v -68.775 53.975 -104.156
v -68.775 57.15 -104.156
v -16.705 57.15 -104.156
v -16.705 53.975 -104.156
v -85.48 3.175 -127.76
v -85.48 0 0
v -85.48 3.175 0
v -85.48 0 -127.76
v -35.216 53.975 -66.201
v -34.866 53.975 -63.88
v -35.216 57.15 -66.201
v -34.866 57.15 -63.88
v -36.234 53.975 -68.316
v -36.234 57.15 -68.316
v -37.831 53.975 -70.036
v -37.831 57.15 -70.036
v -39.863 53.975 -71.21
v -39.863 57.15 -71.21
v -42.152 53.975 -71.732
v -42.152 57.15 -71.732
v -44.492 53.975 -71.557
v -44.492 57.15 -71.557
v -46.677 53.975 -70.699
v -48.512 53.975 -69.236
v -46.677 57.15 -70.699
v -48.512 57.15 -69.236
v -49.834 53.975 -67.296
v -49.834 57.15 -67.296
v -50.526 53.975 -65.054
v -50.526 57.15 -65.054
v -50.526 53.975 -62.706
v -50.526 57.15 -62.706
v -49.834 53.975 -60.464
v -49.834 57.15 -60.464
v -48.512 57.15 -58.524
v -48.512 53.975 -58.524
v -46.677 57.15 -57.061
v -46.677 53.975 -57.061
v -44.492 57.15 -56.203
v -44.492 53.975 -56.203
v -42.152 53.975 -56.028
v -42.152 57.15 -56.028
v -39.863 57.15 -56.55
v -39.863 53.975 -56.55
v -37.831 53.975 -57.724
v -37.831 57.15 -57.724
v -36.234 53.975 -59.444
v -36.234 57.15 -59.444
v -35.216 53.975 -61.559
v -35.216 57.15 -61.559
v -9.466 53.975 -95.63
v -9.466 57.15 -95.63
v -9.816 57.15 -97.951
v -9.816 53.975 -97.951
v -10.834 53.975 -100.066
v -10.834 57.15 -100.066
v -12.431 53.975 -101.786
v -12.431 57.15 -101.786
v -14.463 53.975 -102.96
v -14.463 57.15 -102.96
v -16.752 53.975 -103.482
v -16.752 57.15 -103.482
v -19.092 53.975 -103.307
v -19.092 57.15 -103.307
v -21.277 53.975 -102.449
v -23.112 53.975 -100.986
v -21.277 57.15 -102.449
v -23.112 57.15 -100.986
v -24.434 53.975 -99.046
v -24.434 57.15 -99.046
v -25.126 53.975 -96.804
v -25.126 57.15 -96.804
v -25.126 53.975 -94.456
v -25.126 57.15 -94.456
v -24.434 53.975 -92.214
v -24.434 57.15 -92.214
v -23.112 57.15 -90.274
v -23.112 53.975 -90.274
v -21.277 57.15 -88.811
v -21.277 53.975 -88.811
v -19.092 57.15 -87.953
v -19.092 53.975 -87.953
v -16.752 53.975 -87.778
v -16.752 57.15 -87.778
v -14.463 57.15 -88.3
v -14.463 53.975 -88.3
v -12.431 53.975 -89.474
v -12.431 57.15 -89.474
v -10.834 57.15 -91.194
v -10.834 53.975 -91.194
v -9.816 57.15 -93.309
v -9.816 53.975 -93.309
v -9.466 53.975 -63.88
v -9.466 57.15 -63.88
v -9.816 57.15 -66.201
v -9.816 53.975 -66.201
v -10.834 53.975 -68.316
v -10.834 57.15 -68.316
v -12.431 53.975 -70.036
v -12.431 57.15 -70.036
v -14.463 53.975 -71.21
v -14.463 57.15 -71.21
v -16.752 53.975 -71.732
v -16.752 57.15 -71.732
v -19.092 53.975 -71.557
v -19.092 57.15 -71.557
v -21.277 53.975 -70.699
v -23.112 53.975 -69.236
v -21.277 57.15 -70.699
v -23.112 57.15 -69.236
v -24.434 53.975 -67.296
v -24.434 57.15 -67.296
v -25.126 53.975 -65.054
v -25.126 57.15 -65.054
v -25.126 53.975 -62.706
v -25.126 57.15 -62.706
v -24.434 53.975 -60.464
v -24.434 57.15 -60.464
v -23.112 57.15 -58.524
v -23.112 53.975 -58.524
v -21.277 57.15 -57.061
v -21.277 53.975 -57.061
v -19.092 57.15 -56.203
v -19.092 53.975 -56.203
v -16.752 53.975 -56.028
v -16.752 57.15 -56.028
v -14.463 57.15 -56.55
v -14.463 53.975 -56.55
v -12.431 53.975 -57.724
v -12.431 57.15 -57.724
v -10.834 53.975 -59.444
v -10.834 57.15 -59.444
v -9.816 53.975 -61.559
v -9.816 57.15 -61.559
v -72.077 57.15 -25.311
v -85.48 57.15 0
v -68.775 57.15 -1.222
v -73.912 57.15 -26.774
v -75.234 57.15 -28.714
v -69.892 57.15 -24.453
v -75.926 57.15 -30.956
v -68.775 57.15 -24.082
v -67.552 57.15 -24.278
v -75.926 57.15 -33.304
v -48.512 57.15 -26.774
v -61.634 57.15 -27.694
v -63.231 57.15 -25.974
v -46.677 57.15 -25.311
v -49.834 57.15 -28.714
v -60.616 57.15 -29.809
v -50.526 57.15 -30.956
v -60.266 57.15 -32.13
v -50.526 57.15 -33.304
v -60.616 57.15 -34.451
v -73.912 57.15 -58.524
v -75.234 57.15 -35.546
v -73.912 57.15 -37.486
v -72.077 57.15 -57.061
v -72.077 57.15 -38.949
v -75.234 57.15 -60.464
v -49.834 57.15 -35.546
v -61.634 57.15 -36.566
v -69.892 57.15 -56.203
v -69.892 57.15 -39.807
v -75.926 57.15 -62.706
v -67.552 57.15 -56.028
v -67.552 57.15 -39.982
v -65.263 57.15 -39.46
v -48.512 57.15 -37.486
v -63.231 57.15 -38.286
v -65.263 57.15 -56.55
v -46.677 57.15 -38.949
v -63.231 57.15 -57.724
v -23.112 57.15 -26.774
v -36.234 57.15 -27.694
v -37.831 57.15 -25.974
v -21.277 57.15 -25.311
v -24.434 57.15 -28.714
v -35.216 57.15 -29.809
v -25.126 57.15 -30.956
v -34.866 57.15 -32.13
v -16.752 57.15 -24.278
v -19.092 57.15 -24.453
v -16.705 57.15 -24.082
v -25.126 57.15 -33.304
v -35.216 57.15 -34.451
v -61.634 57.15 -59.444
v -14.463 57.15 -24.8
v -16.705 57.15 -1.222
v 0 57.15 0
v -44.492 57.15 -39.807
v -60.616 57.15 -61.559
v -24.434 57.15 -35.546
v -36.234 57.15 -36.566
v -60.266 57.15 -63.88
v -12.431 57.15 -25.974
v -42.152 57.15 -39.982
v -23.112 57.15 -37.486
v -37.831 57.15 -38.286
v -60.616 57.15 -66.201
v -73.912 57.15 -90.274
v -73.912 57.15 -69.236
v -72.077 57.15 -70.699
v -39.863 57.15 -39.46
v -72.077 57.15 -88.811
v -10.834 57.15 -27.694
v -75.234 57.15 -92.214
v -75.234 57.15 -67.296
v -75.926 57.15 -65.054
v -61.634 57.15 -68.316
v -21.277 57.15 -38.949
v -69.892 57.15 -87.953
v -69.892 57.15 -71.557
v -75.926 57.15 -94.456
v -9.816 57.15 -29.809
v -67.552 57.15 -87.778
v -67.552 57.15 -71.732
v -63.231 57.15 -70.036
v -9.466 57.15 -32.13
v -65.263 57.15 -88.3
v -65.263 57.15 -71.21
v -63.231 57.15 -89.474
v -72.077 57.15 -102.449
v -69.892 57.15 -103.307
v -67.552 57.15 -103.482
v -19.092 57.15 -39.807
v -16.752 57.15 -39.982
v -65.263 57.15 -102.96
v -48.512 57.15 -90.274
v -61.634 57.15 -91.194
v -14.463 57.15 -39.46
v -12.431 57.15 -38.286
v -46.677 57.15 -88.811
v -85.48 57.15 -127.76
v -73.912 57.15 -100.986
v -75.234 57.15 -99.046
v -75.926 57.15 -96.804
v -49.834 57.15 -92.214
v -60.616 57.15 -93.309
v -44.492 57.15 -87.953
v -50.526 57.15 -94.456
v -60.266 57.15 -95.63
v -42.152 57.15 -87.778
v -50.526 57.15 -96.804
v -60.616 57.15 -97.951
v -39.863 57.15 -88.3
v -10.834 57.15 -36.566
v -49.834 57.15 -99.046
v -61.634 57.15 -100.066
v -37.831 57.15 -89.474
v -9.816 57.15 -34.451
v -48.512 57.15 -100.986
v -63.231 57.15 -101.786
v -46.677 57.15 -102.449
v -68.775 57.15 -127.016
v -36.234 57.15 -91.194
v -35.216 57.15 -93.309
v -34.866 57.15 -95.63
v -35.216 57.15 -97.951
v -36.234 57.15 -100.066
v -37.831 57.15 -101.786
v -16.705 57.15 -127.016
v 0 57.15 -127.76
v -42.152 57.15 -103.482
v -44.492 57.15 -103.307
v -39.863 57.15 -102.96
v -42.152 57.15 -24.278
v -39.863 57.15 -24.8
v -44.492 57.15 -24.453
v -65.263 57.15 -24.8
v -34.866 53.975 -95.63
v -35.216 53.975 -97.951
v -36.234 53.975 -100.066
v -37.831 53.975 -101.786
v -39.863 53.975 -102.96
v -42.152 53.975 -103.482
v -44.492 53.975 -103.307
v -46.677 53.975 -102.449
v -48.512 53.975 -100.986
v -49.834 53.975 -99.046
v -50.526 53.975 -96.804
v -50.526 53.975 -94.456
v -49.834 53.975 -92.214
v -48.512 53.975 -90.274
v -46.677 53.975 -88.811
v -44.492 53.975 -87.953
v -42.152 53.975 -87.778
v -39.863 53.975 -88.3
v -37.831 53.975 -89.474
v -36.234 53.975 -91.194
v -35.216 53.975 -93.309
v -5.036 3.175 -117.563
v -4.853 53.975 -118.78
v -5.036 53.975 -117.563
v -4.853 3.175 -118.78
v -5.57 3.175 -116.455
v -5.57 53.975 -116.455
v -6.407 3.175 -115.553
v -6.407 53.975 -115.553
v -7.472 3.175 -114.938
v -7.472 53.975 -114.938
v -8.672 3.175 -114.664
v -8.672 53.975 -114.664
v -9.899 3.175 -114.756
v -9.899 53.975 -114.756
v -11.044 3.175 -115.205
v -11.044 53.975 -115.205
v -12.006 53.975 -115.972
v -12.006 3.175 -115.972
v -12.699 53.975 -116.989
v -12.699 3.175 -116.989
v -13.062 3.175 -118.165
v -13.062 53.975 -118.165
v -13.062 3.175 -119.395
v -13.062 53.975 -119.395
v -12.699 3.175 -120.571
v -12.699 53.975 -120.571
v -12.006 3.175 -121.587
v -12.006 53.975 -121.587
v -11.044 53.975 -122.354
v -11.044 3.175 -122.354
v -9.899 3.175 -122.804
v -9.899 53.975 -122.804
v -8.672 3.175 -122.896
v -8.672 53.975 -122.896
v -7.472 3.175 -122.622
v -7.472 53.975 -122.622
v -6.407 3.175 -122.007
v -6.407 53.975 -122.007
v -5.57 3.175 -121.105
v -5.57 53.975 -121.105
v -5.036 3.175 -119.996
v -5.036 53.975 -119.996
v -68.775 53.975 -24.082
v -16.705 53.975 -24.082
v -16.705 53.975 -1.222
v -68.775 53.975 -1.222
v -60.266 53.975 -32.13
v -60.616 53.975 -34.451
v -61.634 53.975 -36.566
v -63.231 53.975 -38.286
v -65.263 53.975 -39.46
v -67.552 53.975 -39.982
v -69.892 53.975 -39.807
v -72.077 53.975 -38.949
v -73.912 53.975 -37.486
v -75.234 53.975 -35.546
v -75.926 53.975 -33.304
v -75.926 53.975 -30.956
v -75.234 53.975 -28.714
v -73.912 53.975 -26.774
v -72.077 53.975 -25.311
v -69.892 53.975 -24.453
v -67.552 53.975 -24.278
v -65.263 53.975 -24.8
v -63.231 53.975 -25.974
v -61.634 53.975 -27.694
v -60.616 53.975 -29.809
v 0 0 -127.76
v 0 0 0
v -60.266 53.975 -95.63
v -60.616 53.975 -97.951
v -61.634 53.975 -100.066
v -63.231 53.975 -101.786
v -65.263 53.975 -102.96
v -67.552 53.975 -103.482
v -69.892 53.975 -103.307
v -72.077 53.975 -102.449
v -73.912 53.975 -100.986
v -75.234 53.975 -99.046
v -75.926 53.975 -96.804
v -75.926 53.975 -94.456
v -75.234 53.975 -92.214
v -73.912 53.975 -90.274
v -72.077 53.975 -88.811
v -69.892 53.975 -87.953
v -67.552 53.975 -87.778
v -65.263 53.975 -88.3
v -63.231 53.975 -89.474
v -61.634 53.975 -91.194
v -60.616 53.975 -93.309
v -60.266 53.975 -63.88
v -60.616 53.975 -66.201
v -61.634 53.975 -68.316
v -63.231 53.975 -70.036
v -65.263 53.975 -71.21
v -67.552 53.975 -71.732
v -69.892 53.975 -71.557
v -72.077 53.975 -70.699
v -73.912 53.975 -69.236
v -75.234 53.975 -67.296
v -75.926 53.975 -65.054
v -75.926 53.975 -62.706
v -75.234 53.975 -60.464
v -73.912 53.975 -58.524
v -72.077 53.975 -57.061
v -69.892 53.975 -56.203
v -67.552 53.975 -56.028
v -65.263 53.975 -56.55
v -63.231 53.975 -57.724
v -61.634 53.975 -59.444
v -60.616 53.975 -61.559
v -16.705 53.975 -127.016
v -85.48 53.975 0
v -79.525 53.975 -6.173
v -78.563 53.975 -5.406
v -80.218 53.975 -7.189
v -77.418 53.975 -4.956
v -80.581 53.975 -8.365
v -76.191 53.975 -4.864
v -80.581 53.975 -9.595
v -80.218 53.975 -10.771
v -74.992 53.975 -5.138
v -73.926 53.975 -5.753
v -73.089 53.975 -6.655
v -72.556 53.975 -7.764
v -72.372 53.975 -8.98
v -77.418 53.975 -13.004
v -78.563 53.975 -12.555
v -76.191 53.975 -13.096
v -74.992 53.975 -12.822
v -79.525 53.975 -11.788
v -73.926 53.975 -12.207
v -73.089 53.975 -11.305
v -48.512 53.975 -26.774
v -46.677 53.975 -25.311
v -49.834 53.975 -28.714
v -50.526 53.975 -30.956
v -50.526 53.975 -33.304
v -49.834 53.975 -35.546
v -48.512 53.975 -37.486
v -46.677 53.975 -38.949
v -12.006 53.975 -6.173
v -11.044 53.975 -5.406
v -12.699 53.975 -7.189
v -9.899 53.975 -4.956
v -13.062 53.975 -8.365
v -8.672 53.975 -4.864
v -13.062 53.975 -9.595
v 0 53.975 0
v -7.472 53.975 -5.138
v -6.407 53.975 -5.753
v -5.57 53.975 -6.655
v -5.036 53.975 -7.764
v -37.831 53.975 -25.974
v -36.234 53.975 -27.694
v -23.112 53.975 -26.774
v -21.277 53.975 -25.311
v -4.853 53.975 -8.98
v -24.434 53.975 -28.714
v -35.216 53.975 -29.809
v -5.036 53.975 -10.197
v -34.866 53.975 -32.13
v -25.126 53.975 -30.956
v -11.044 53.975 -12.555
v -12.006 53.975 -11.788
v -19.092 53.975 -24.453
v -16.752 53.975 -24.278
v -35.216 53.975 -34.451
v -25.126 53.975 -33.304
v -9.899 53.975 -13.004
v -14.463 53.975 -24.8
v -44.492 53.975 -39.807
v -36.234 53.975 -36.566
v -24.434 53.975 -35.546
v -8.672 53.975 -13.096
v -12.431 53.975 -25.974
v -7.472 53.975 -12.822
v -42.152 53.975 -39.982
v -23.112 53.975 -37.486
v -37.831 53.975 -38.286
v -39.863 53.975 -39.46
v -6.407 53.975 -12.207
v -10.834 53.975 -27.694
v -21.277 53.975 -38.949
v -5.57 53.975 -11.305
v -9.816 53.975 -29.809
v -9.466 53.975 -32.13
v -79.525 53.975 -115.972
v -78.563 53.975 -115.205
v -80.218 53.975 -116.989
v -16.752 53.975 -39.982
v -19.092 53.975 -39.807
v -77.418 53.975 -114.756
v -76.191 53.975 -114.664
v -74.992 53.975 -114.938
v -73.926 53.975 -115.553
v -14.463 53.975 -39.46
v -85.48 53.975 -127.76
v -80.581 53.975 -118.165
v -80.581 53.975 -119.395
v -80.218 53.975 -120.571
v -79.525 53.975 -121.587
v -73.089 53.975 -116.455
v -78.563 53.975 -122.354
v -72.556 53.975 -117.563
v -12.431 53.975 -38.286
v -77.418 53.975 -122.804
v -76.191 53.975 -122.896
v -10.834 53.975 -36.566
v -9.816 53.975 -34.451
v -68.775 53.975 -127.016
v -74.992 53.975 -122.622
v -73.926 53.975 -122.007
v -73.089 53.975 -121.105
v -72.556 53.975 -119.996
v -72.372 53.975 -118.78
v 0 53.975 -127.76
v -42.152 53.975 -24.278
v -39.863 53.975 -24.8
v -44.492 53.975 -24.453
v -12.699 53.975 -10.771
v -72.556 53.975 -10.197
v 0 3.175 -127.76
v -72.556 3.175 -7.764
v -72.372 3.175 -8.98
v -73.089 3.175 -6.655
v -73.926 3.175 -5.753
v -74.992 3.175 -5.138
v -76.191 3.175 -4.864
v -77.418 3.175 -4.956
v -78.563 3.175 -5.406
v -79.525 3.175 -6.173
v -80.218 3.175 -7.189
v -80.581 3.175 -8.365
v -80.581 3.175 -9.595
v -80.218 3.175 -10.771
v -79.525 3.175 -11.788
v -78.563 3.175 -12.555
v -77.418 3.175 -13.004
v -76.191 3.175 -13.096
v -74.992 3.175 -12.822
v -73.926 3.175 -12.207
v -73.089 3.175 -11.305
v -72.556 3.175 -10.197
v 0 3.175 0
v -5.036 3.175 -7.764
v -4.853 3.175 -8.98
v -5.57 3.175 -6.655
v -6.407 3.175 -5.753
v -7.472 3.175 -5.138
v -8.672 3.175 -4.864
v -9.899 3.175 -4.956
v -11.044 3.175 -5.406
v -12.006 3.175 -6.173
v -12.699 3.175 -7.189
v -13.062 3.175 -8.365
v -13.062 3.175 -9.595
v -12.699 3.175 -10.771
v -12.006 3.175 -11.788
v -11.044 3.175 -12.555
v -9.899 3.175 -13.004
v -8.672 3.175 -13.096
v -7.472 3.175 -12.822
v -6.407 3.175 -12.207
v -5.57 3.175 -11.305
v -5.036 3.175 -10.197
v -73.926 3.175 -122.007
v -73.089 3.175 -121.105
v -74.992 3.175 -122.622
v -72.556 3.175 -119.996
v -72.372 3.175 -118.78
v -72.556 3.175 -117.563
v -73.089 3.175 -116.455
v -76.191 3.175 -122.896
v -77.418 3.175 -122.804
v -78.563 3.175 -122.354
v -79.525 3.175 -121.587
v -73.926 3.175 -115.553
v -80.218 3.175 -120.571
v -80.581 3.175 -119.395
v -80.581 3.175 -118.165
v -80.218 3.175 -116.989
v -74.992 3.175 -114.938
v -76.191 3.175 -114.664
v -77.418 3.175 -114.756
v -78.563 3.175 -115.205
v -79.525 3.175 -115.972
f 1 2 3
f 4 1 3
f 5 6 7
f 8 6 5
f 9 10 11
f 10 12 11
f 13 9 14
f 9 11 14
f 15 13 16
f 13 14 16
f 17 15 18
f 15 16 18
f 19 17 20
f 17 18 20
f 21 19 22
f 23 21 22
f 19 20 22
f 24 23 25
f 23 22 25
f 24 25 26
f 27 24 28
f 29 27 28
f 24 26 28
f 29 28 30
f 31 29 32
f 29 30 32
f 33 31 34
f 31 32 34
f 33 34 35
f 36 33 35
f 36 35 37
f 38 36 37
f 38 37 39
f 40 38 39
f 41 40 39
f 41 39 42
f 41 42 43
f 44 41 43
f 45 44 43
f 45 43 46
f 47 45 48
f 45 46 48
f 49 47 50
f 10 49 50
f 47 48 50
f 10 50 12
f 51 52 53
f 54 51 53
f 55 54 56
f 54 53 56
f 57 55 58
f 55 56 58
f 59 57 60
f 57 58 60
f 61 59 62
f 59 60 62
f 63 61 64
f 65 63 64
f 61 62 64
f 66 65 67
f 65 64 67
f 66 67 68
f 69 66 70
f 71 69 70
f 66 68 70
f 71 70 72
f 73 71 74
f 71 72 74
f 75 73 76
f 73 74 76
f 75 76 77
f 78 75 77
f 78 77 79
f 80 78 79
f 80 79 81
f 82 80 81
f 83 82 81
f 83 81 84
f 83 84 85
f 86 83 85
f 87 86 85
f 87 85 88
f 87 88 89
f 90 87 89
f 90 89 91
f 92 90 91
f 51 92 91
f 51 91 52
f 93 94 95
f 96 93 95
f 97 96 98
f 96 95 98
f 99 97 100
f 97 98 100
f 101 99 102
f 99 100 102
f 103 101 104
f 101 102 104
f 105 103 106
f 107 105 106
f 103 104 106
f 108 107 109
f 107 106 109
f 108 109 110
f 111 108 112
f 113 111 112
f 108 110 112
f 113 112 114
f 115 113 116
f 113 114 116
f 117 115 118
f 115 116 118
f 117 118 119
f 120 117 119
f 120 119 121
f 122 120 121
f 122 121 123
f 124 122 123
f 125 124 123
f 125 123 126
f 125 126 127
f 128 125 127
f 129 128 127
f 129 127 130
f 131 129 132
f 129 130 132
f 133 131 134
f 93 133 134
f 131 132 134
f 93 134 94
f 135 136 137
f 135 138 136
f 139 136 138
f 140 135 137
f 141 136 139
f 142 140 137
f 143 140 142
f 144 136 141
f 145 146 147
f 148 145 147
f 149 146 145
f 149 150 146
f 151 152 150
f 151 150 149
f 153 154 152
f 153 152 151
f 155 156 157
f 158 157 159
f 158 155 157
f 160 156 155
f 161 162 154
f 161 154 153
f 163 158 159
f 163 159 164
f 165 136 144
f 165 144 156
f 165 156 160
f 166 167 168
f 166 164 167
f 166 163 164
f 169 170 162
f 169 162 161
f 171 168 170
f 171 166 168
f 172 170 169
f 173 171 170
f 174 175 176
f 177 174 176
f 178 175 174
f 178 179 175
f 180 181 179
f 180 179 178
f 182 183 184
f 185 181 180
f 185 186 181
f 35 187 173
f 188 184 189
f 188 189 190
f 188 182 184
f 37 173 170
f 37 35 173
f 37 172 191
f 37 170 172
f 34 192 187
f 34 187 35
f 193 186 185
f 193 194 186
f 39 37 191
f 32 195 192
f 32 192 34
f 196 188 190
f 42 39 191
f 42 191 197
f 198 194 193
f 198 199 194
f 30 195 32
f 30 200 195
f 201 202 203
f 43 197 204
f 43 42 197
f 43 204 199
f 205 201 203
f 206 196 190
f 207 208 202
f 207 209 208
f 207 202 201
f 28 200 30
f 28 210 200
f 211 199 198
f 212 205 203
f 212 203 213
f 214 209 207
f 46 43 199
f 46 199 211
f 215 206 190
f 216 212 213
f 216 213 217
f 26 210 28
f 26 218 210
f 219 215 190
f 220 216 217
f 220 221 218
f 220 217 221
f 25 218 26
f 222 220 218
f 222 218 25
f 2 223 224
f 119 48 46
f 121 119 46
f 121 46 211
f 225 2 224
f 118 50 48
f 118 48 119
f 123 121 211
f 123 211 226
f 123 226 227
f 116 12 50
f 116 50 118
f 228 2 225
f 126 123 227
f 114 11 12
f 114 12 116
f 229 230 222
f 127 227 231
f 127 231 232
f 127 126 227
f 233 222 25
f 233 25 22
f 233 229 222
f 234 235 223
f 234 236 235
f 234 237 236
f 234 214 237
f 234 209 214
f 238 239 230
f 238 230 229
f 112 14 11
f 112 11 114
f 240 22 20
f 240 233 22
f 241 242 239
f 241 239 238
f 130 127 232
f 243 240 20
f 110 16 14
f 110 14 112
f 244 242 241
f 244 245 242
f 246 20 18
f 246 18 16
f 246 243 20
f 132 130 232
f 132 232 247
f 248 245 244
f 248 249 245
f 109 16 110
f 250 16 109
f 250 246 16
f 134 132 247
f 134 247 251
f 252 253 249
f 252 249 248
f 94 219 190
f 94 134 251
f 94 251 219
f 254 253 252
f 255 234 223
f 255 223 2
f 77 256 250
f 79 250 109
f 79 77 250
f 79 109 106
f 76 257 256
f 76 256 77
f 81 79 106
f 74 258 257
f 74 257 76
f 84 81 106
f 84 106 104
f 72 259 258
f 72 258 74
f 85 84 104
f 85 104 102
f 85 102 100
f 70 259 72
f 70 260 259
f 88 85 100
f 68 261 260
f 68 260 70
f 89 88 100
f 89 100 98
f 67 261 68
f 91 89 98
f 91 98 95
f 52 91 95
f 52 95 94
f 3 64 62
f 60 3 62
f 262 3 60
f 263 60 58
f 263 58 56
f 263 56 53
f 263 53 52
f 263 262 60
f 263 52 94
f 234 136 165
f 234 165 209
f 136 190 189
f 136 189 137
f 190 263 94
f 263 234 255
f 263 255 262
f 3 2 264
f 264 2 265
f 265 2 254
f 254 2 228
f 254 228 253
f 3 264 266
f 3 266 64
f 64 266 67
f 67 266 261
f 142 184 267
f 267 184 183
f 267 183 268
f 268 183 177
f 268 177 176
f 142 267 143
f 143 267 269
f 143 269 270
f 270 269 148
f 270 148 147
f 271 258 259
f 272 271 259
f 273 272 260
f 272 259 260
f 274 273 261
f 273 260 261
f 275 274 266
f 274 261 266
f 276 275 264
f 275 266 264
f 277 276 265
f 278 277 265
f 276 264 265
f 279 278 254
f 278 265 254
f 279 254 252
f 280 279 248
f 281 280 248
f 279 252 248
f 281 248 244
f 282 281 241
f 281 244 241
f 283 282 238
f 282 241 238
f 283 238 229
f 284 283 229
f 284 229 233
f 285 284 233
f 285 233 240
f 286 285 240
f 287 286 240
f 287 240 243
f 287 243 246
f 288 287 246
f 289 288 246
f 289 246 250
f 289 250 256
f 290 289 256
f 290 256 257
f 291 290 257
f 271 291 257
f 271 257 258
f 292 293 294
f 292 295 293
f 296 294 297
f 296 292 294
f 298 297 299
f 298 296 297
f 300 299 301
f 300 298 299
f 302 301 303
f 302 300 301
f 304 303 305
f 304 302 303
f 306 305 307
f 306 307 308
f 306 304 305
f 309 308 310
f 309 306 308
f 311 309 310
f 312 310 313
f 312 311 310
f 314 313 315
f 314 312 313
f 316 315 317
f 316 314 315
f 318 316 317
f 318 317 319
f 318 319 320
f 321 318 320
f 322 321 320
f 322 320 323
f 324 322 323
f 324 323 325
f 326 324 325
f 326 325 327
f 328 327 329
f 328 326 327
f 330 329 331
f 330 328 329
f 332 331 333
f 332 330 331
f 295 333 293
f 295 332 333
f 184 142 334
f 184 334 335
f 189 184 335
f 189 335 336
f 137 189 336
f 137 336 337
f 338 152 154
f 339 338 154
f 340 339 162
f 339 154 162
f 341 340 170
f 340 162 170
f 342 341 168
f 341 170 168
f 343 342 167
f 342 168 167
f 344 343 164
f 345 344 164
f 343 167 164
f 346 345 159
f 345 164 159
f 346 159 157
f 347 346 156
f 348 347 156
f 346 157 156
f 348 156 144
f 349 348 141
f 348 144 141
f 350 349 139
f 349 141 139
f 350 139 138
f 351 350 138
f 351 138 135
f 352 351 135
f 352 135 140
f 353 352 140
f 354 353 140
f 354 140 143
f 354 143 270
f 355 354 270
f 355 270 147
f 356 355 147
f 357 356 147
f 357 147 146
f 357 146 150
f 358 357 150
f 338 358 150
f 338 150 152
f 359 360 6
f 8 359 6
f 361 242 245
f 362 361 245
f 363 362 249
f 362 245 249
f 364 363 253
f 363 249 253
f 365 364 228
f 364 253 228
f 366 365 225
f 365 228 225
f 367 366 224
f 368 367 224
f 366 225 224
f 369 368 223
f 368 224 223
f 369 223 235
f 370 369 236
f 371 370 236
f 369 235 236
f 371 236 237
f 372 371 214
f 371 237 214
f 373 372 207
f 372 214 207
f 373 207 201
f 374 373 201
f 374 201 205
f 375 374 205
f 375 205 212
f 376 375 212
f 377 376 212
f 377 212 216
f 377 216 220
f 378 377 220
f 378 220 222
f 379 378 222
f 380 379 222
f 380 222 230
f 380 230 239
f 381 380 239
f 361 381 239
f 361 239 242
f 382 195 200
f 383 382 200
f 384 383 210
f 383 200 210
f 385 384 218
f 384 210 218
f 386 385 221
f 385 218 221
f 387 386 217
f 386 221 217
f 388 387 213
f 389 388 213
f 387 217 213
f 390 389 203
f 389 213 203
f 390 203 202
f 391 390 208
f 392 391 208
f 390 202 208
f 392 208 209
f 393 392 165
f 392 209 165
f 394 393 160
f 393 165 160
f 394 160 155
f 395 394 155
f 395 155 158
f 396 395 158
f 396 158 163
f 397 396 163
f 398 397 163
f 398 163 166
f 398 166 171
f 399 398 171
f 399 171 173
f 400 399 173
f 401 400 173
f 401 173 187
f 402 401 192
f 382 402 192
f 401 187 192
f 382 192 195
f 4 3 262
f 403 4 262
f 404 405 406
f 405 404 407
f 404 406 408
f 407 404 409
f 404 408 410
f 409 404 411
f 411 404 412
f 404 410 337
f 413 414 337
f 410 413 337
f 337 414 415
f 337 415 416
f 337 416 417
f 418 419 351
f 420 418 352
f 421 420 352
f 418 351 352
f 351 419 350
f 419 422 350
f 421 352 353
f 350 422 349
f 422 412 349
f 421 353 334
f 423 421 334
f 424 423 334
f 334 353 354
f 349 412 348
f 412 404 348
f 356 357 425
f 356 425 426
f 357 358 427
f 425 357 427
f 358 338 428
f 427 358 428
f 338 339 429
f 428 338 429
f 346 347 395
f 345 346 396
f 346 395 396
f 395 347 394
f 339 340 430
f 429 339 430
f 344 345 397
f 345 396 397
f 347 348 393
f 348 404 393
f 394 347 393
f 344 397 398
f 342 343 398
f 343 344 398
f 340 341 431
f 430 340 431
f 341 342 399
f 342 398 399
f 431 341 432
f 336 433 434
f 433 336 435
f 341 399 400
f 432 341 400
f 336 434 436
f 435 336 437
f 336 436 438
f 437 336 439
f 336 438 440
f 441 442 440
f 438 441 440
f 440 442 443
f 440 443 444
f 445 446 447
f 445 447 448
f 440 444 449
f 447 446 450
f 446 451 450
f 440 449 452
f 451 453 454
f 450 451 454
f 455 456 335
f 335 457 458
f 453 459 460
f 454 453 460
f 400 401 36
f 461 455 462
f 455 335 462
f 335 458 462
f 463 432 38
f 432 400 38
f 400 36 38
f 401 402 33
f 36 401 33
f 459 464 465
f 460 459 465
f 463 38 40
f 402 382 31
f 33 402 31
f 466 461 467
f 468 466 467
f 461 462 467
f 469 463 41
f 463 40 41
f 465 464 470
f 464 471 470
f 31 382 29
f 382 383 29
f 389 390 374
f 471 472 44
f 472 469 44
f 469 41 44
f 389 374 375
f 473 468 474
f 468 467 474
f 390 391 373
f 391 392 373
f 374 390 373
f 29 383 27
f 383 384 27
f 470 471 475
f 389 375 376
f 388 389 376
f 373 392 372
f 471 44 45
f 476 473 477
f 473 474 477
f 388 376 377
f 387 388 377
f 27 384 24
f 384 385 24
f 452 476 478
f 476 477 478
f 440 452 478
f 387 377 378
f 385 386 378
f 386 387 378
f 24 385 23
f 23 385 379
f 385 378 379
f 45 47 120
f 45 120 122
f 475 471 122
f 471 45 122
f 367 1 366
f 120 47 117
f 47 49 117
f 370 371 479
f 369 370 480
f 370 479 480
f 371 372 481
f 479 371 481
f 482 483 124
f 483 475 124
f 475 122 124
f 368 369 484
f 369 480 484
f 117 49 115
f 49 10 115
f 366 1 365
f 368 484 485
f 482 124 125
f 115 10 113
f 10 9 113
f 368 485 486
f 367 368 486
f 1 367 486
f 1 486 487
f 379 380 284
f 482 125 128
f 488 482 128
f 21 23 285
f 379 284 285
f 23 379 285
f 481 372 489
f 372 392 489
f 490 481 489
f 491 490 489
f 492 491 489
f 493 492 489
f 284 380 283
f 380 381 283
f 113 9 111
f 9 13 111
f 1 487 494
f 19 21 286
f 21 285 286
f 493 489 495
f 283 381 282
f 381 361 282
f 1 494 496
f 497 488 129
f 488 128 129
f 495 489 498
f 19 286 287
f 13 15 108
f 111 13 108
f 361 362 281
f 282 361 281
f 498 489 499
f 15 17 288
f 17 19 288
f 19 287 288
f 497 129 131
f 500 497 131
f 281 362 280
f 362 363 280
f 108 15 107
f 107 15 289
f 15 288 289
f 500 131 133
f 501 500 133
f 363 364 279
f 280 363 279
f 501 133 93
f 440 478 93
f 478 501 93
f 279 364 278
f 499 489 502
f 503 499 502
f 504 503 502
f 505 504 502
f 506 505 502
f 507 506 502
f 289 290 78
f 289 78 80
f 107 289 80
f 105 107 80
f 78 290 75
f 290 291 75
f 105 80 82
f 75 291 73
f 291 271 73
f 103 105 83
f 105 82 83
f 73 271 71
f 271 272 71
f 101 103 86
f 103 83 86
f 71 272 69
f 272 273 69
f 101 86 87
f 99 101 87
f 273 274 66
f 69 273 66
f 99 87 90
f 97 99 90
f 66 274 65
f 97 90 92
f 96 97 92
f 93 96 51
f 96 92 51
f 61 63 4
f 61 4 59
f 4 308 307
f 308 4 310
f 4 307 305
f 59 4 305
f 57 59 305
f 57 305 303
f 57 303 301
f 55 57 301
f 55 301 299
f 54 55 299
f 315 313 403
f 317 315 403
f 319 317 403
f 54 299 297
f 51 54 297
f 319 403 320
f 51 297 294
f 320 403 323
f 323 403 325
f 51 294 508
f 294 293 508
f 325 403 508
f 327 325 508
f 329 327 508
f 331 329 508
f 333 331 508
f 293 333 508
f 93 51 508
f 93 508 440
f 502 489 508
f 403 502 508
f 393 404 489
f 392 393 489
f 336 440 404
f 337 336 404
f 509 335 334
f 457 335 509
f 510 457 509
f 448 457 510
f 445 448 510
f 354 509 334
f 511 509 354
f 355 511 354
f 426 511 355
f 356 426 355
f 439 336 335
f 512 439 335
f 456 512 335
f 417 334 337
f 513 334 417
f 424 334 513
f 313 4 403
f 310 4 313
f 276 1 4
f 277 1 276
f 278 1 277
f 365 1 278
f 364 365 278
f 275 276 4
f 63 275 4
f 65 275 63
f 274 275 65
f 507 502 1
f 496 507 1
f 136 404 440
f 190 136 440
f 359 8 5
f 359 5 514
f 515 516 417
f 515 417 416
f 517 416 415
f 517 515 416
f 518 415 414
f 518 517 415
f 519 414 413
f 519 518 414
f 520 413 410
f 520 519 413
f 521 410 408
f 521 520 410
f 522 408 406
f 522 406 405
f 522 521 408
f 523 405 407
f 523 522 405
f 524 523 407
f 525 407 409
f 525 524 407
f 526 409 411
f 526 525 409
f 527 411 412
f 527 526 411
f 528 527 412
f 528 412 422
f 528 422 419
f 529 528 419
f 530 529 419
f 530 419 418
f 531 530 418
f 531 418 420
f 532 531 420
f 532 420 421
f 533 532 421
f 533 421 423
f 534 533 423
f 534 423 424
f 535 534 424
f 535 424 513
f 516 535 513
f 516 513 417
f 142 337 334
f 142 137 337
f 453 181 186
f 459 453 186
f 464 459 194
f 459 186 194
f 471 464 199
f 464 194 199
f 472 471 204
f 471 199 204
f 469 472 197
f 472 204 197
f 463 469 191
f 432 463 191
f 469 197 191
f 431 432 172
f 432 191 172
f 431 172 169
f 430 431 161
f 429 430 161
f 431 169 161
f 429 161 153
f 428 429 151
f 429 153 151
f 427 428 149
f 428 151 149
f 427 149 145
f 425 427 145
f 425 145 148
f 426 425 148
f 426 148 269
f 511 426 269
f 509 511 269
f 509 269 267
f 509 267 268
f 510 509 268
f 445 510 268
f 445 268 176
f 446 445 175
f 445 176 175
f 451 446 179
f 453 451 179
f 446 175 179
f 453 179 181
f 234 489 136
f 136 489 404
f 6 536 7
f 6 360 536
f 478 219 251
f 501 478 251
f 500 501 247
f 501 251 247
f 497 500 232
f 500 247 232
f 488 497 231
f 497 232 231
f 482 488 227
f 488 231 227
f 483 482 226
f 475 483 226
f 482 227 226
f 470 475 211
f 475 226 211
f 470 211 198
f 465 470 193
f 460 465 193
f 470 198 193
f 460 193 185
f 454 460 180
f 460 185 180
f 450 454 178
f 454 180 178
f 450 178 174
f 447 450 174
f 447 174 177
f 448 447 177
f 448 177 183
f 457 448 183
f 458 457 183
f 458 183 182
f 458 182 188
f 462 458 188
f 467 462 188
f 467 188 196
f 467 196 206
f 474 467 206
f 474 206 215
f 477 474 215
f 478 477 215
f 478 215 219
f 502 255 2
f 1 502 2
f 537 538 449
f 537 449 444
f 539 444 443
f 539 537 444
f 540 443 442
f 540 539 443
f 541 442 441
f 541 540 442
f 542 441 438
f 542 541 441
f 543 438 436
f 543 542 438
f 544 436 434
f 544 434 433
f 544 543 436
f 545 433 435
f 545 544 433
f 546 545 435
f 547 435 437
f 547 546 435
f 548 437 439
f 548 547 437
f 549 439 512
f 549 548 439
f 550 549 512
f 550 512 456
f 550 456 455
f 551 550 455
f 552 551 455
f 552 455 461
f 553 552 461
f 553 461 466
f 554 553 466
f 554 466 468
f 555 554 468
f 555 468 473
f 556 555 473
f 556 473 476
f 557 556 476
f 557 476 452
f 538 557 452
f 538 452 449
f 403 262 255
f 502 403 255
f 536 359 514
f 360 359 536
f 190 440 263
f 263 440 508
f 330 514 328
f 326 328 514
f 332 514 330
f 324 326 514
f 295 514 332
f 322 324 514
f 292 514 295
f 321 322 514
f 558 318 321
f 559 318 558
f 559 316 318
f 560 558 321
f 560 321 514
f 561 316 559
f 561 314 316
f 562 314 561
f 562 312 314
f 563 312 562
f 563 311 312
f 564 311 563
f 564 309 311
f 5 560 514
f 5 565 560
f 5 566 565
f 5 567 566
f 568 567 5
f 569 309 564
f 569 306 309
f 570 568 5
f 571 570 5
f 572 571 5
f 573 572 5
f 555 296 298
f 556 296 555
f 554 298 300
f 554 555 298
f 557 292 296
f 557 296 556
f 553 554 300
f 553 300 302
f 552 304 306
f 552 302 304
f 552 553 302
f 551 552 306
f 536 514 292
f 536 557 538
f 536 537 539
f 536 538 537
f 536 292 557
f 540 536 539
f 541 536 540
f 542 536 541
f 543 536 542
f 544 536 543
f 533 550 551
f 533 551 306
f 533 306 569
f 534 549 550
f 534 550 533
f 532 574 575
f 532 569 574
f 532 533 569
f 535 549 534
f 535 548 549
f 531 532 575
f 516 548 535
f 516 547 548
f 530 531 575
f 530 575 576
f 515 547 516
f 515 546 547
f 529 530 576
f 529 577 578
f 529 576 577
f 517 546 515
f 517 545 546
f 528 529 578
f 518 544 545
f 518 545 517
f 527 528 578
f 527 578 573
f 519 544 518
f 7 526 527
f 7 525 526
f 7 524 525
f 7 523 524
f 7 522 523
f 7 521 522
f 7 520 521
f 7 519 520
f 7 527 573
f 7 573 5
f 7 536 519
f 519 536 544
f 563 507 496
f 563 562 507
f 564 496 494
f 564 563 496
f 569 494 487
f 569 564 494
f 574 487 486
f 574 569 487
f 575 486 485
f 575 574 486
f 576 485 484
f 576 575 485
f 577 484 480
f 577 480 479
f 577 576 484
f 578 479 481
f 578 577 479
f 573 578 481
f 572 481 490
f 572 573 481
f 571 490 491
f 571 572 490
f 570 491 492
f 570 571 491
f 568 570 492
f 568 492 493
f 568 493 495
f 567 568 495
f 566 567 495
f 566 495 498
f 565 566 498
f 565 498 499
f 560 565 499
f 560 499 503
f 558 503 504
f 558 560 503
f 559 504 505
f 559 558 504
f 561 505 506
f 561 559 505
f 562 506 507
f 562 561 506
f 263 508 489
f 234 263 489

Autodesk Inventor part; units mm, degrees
ref_plane "YZ Plane" through (0, 0, 0) normal (1, 0, 0) x (0, 1, 0)
ref_plane "XZ Plane" through (0, 0, 0) normal (0, 1, 0) x (-1, 0, 0)
ref_plane "XY Plane" through (0, 0, 0) normal (0, 0, 1) x (1, 0, 0)
sketch "Sketch1" plane through (0, 0, 0) normal (0, 1, 0) x (-1, 0, 0)
  line L0 (0, 0) -> (85.48, 0)
  line L1 (85.48, 0) -> (85.48, -127.76)
  line L2 (85.48, -127.76) -> (0, -127.76)
  line L3 (0, -127.76) -> (0, 0)
  dimension "d0" = 85.48
  dimension "d1" = 127.76
extrude "Extrusion1" add sketch "Sketch1" along normal blind 3.175
sketch "Sketch2" plane through (0, 3.175, 0) normal (0, 1, 0) x (1, 0, 0)
  line L0 (0, 0) -> (-8.9803, 8.9803)
  line L1 (-85.48, 127.76) -> (-85.48, 0) projected
  line L2 (-85.48, 0) -> (-76.4997, 8.9803)
  line L3 (-85.48, 0) -> (-72.78, 0) construction
  line L4 (0, 127.76) -> (-85.48, 127.76) projected
  line L5 (-85.48, 127.76) -> (-76.4997, 118.7797)
  line L6 (-85.48, 127.76) -> (-72.78, 127.76) construction
  line L7 (0, 127.76) -> (-8.9803, 118.7797)
  circle A0 centre (-76.4997, 118.7797) radius 4.1275
  circle A1 centre (-8.9803, 118.7797) radius 4.1275
  circle A2 centre (-76.4997, 8.9803) radius 4.1275
  circle A3 centre (-8.9803, 8.9803) radius 4.1275
  dimension "d4" = 12.7
  dimension "d5" = 12.7
  dimension "d6" = 45
  dimension "d7" = 12.7
  dimension "d8" = 45
  dimension "d9" = 12.7
  dimension "d10" = 8.255
  dimension "d11" = 8.255
  dimension "d12" = 8.255
  dimension "d13" = 8.255
extrude "Extrusion2" add sketch "Sketch2" along normal blind 50.8
sketch "Sketch3" plane through (-76.4997, 53.975, -8.9803) normal (0, 1, 0) x (1, 0, 0)
  line L0 (-8.9803, -8.9803) -> (76.4997, -8.9803) projected
  line L1 (-8.9803, 118.7797) -> (-8.9803, -8.9803) projected
  line L2 (76.4997, 118.7797) -> (-8.9803, 118.7797) projected
  line L3 (76.4997, -8.9803) -> (76.4997, 118.7797) projected
extrude "Extrusion3" add sketch "Sketch3" along normal blind 3.175
sketch "Sketch4" plane through (-76.4997, 57.15, -8.9803) normal (0, 1, 0) x (1, 0, 0)
  line L0 (-8.9803, -8.9803) -> (76.4997, -8.9803) projected
  line L1 (33.7597, -8.9803) -> (33.7597, 118.7797)
  line L2 (76.4997, 118.7797) -> (-8.9803, 118.7797) projected
  line L3 (33.7597, 54.8997) -> (33.7597, 86.6497)
  line L4 (33.7597, 54.8997) -> (65.5097, 54.8997) construction
  line L5 (33.7597, 54.8997) -> (33.7597, 23.1497)
  circle A0 centre (33.7597, 86.6497) radius 7.874
  circle A1 centre (33.7597, 23.1497) radius 7.874
  circle A2 centre (33.7597, 54.8997) radius 7.874
  line L6 (33.7597, 86.6497) -> (59.1597, 86.6497)
  circle A3 centre (59.1597, 86.6497) radius 7.874
  line L7 (33.7597, 86.6497) -> (8.3597, 86.6497)
  line L8 (33.7597, 54.8997) -> (59.1597, 54.8997)
  line L9 (33.7597, 54.8997) -> (8.3597, 54.8997)
  line L10 (33.7597, 23.1497) -> (59.1597, 23.1497)
  line L11 (33.7597, 23.1497) -> (8.3597, 23.1497)
  line L12 (33.7597, 23.1497) -> (59.1597, 23.1497) construction
  circle A4 centre (8.3597, 86.6497) radius 7.874
  circle A5 centre (8.3597, 54.8997) radius 7.874
  circle A6 centre (59.1597, 54.8997) radius 7.874
  circle A7 centre (59.1597, 23.1497) radius 7.874
  circle A8 centre (8.3597, 23.1497) radius 7.874
  line L13 (7.7247, 95.1761) -> (59.7947, 95.1761)
  line L14 (59.7947, 95.1761) -> (59.7947, 118.0361)
  line L15 (59.7947, 118.0361) -> (7.7247, 118.0361)
  line L16 (7.7247, 118.0361) -> (7.7247, 95.1761)
  line L17 (7.7247, 95.1761) -> (59.7947, 118.0361) construction
  line L18 (59.7947, 95.1761) -> (7.7247, 118.0361) construction
  line L19 (7.7247, 15.1012) -> (59.7947, 15.1012)
  line L20 (59.7947, 15.1012) -> (59.7947, -7.7588)
  line L21 (59.7947, -7.7588) -> (7.7247, -7.7588)
  line L22 (7.7247, -7.7588) -> (7.7247, 15.1012)
  line L23 (7.7247, 15.1012) -> (59.7947, -7.7588) construction
  line L24 (59.7947, 15.1012) -> (7.7247, -7.7588) construction
  point P0 (33.7597, 106.6061)
  point P1 (33.7597, 3.6712)
  dimension "d18" = 31.75
  dimension "d19" = 90
  dimension "d20" = 31.75
  dimension "d21" = 15.748
  dimension "d22" = 15.748
  dimension "d25" = 15.748
  dimension "d26" = 25.4
  dimension "d27" = 15.748
  dimension "d28" = 25.4
  dimension "d29" = 25.4
  dimension "d30" = 25.4
  dimension "d31" = 25.4
  dimension "d32" = 25.4
  dimension "d33" = 180
  dimension "d34" = 15.748
  dimension "d35" = 15.748
  dimension "d36" = 15.748
  dimension "d37" = 15.748
  dimension "d38" = 15.748
  dimension "d39" = 52.07
  dimension "d40" = 22.86
  dimension "d41" = 52.07
  dimension "d42" = 22.86
extrude "Extrusion4" cut sketch "Sketch4" against normal blind 3.175
properties part number "Elve tube holder"
